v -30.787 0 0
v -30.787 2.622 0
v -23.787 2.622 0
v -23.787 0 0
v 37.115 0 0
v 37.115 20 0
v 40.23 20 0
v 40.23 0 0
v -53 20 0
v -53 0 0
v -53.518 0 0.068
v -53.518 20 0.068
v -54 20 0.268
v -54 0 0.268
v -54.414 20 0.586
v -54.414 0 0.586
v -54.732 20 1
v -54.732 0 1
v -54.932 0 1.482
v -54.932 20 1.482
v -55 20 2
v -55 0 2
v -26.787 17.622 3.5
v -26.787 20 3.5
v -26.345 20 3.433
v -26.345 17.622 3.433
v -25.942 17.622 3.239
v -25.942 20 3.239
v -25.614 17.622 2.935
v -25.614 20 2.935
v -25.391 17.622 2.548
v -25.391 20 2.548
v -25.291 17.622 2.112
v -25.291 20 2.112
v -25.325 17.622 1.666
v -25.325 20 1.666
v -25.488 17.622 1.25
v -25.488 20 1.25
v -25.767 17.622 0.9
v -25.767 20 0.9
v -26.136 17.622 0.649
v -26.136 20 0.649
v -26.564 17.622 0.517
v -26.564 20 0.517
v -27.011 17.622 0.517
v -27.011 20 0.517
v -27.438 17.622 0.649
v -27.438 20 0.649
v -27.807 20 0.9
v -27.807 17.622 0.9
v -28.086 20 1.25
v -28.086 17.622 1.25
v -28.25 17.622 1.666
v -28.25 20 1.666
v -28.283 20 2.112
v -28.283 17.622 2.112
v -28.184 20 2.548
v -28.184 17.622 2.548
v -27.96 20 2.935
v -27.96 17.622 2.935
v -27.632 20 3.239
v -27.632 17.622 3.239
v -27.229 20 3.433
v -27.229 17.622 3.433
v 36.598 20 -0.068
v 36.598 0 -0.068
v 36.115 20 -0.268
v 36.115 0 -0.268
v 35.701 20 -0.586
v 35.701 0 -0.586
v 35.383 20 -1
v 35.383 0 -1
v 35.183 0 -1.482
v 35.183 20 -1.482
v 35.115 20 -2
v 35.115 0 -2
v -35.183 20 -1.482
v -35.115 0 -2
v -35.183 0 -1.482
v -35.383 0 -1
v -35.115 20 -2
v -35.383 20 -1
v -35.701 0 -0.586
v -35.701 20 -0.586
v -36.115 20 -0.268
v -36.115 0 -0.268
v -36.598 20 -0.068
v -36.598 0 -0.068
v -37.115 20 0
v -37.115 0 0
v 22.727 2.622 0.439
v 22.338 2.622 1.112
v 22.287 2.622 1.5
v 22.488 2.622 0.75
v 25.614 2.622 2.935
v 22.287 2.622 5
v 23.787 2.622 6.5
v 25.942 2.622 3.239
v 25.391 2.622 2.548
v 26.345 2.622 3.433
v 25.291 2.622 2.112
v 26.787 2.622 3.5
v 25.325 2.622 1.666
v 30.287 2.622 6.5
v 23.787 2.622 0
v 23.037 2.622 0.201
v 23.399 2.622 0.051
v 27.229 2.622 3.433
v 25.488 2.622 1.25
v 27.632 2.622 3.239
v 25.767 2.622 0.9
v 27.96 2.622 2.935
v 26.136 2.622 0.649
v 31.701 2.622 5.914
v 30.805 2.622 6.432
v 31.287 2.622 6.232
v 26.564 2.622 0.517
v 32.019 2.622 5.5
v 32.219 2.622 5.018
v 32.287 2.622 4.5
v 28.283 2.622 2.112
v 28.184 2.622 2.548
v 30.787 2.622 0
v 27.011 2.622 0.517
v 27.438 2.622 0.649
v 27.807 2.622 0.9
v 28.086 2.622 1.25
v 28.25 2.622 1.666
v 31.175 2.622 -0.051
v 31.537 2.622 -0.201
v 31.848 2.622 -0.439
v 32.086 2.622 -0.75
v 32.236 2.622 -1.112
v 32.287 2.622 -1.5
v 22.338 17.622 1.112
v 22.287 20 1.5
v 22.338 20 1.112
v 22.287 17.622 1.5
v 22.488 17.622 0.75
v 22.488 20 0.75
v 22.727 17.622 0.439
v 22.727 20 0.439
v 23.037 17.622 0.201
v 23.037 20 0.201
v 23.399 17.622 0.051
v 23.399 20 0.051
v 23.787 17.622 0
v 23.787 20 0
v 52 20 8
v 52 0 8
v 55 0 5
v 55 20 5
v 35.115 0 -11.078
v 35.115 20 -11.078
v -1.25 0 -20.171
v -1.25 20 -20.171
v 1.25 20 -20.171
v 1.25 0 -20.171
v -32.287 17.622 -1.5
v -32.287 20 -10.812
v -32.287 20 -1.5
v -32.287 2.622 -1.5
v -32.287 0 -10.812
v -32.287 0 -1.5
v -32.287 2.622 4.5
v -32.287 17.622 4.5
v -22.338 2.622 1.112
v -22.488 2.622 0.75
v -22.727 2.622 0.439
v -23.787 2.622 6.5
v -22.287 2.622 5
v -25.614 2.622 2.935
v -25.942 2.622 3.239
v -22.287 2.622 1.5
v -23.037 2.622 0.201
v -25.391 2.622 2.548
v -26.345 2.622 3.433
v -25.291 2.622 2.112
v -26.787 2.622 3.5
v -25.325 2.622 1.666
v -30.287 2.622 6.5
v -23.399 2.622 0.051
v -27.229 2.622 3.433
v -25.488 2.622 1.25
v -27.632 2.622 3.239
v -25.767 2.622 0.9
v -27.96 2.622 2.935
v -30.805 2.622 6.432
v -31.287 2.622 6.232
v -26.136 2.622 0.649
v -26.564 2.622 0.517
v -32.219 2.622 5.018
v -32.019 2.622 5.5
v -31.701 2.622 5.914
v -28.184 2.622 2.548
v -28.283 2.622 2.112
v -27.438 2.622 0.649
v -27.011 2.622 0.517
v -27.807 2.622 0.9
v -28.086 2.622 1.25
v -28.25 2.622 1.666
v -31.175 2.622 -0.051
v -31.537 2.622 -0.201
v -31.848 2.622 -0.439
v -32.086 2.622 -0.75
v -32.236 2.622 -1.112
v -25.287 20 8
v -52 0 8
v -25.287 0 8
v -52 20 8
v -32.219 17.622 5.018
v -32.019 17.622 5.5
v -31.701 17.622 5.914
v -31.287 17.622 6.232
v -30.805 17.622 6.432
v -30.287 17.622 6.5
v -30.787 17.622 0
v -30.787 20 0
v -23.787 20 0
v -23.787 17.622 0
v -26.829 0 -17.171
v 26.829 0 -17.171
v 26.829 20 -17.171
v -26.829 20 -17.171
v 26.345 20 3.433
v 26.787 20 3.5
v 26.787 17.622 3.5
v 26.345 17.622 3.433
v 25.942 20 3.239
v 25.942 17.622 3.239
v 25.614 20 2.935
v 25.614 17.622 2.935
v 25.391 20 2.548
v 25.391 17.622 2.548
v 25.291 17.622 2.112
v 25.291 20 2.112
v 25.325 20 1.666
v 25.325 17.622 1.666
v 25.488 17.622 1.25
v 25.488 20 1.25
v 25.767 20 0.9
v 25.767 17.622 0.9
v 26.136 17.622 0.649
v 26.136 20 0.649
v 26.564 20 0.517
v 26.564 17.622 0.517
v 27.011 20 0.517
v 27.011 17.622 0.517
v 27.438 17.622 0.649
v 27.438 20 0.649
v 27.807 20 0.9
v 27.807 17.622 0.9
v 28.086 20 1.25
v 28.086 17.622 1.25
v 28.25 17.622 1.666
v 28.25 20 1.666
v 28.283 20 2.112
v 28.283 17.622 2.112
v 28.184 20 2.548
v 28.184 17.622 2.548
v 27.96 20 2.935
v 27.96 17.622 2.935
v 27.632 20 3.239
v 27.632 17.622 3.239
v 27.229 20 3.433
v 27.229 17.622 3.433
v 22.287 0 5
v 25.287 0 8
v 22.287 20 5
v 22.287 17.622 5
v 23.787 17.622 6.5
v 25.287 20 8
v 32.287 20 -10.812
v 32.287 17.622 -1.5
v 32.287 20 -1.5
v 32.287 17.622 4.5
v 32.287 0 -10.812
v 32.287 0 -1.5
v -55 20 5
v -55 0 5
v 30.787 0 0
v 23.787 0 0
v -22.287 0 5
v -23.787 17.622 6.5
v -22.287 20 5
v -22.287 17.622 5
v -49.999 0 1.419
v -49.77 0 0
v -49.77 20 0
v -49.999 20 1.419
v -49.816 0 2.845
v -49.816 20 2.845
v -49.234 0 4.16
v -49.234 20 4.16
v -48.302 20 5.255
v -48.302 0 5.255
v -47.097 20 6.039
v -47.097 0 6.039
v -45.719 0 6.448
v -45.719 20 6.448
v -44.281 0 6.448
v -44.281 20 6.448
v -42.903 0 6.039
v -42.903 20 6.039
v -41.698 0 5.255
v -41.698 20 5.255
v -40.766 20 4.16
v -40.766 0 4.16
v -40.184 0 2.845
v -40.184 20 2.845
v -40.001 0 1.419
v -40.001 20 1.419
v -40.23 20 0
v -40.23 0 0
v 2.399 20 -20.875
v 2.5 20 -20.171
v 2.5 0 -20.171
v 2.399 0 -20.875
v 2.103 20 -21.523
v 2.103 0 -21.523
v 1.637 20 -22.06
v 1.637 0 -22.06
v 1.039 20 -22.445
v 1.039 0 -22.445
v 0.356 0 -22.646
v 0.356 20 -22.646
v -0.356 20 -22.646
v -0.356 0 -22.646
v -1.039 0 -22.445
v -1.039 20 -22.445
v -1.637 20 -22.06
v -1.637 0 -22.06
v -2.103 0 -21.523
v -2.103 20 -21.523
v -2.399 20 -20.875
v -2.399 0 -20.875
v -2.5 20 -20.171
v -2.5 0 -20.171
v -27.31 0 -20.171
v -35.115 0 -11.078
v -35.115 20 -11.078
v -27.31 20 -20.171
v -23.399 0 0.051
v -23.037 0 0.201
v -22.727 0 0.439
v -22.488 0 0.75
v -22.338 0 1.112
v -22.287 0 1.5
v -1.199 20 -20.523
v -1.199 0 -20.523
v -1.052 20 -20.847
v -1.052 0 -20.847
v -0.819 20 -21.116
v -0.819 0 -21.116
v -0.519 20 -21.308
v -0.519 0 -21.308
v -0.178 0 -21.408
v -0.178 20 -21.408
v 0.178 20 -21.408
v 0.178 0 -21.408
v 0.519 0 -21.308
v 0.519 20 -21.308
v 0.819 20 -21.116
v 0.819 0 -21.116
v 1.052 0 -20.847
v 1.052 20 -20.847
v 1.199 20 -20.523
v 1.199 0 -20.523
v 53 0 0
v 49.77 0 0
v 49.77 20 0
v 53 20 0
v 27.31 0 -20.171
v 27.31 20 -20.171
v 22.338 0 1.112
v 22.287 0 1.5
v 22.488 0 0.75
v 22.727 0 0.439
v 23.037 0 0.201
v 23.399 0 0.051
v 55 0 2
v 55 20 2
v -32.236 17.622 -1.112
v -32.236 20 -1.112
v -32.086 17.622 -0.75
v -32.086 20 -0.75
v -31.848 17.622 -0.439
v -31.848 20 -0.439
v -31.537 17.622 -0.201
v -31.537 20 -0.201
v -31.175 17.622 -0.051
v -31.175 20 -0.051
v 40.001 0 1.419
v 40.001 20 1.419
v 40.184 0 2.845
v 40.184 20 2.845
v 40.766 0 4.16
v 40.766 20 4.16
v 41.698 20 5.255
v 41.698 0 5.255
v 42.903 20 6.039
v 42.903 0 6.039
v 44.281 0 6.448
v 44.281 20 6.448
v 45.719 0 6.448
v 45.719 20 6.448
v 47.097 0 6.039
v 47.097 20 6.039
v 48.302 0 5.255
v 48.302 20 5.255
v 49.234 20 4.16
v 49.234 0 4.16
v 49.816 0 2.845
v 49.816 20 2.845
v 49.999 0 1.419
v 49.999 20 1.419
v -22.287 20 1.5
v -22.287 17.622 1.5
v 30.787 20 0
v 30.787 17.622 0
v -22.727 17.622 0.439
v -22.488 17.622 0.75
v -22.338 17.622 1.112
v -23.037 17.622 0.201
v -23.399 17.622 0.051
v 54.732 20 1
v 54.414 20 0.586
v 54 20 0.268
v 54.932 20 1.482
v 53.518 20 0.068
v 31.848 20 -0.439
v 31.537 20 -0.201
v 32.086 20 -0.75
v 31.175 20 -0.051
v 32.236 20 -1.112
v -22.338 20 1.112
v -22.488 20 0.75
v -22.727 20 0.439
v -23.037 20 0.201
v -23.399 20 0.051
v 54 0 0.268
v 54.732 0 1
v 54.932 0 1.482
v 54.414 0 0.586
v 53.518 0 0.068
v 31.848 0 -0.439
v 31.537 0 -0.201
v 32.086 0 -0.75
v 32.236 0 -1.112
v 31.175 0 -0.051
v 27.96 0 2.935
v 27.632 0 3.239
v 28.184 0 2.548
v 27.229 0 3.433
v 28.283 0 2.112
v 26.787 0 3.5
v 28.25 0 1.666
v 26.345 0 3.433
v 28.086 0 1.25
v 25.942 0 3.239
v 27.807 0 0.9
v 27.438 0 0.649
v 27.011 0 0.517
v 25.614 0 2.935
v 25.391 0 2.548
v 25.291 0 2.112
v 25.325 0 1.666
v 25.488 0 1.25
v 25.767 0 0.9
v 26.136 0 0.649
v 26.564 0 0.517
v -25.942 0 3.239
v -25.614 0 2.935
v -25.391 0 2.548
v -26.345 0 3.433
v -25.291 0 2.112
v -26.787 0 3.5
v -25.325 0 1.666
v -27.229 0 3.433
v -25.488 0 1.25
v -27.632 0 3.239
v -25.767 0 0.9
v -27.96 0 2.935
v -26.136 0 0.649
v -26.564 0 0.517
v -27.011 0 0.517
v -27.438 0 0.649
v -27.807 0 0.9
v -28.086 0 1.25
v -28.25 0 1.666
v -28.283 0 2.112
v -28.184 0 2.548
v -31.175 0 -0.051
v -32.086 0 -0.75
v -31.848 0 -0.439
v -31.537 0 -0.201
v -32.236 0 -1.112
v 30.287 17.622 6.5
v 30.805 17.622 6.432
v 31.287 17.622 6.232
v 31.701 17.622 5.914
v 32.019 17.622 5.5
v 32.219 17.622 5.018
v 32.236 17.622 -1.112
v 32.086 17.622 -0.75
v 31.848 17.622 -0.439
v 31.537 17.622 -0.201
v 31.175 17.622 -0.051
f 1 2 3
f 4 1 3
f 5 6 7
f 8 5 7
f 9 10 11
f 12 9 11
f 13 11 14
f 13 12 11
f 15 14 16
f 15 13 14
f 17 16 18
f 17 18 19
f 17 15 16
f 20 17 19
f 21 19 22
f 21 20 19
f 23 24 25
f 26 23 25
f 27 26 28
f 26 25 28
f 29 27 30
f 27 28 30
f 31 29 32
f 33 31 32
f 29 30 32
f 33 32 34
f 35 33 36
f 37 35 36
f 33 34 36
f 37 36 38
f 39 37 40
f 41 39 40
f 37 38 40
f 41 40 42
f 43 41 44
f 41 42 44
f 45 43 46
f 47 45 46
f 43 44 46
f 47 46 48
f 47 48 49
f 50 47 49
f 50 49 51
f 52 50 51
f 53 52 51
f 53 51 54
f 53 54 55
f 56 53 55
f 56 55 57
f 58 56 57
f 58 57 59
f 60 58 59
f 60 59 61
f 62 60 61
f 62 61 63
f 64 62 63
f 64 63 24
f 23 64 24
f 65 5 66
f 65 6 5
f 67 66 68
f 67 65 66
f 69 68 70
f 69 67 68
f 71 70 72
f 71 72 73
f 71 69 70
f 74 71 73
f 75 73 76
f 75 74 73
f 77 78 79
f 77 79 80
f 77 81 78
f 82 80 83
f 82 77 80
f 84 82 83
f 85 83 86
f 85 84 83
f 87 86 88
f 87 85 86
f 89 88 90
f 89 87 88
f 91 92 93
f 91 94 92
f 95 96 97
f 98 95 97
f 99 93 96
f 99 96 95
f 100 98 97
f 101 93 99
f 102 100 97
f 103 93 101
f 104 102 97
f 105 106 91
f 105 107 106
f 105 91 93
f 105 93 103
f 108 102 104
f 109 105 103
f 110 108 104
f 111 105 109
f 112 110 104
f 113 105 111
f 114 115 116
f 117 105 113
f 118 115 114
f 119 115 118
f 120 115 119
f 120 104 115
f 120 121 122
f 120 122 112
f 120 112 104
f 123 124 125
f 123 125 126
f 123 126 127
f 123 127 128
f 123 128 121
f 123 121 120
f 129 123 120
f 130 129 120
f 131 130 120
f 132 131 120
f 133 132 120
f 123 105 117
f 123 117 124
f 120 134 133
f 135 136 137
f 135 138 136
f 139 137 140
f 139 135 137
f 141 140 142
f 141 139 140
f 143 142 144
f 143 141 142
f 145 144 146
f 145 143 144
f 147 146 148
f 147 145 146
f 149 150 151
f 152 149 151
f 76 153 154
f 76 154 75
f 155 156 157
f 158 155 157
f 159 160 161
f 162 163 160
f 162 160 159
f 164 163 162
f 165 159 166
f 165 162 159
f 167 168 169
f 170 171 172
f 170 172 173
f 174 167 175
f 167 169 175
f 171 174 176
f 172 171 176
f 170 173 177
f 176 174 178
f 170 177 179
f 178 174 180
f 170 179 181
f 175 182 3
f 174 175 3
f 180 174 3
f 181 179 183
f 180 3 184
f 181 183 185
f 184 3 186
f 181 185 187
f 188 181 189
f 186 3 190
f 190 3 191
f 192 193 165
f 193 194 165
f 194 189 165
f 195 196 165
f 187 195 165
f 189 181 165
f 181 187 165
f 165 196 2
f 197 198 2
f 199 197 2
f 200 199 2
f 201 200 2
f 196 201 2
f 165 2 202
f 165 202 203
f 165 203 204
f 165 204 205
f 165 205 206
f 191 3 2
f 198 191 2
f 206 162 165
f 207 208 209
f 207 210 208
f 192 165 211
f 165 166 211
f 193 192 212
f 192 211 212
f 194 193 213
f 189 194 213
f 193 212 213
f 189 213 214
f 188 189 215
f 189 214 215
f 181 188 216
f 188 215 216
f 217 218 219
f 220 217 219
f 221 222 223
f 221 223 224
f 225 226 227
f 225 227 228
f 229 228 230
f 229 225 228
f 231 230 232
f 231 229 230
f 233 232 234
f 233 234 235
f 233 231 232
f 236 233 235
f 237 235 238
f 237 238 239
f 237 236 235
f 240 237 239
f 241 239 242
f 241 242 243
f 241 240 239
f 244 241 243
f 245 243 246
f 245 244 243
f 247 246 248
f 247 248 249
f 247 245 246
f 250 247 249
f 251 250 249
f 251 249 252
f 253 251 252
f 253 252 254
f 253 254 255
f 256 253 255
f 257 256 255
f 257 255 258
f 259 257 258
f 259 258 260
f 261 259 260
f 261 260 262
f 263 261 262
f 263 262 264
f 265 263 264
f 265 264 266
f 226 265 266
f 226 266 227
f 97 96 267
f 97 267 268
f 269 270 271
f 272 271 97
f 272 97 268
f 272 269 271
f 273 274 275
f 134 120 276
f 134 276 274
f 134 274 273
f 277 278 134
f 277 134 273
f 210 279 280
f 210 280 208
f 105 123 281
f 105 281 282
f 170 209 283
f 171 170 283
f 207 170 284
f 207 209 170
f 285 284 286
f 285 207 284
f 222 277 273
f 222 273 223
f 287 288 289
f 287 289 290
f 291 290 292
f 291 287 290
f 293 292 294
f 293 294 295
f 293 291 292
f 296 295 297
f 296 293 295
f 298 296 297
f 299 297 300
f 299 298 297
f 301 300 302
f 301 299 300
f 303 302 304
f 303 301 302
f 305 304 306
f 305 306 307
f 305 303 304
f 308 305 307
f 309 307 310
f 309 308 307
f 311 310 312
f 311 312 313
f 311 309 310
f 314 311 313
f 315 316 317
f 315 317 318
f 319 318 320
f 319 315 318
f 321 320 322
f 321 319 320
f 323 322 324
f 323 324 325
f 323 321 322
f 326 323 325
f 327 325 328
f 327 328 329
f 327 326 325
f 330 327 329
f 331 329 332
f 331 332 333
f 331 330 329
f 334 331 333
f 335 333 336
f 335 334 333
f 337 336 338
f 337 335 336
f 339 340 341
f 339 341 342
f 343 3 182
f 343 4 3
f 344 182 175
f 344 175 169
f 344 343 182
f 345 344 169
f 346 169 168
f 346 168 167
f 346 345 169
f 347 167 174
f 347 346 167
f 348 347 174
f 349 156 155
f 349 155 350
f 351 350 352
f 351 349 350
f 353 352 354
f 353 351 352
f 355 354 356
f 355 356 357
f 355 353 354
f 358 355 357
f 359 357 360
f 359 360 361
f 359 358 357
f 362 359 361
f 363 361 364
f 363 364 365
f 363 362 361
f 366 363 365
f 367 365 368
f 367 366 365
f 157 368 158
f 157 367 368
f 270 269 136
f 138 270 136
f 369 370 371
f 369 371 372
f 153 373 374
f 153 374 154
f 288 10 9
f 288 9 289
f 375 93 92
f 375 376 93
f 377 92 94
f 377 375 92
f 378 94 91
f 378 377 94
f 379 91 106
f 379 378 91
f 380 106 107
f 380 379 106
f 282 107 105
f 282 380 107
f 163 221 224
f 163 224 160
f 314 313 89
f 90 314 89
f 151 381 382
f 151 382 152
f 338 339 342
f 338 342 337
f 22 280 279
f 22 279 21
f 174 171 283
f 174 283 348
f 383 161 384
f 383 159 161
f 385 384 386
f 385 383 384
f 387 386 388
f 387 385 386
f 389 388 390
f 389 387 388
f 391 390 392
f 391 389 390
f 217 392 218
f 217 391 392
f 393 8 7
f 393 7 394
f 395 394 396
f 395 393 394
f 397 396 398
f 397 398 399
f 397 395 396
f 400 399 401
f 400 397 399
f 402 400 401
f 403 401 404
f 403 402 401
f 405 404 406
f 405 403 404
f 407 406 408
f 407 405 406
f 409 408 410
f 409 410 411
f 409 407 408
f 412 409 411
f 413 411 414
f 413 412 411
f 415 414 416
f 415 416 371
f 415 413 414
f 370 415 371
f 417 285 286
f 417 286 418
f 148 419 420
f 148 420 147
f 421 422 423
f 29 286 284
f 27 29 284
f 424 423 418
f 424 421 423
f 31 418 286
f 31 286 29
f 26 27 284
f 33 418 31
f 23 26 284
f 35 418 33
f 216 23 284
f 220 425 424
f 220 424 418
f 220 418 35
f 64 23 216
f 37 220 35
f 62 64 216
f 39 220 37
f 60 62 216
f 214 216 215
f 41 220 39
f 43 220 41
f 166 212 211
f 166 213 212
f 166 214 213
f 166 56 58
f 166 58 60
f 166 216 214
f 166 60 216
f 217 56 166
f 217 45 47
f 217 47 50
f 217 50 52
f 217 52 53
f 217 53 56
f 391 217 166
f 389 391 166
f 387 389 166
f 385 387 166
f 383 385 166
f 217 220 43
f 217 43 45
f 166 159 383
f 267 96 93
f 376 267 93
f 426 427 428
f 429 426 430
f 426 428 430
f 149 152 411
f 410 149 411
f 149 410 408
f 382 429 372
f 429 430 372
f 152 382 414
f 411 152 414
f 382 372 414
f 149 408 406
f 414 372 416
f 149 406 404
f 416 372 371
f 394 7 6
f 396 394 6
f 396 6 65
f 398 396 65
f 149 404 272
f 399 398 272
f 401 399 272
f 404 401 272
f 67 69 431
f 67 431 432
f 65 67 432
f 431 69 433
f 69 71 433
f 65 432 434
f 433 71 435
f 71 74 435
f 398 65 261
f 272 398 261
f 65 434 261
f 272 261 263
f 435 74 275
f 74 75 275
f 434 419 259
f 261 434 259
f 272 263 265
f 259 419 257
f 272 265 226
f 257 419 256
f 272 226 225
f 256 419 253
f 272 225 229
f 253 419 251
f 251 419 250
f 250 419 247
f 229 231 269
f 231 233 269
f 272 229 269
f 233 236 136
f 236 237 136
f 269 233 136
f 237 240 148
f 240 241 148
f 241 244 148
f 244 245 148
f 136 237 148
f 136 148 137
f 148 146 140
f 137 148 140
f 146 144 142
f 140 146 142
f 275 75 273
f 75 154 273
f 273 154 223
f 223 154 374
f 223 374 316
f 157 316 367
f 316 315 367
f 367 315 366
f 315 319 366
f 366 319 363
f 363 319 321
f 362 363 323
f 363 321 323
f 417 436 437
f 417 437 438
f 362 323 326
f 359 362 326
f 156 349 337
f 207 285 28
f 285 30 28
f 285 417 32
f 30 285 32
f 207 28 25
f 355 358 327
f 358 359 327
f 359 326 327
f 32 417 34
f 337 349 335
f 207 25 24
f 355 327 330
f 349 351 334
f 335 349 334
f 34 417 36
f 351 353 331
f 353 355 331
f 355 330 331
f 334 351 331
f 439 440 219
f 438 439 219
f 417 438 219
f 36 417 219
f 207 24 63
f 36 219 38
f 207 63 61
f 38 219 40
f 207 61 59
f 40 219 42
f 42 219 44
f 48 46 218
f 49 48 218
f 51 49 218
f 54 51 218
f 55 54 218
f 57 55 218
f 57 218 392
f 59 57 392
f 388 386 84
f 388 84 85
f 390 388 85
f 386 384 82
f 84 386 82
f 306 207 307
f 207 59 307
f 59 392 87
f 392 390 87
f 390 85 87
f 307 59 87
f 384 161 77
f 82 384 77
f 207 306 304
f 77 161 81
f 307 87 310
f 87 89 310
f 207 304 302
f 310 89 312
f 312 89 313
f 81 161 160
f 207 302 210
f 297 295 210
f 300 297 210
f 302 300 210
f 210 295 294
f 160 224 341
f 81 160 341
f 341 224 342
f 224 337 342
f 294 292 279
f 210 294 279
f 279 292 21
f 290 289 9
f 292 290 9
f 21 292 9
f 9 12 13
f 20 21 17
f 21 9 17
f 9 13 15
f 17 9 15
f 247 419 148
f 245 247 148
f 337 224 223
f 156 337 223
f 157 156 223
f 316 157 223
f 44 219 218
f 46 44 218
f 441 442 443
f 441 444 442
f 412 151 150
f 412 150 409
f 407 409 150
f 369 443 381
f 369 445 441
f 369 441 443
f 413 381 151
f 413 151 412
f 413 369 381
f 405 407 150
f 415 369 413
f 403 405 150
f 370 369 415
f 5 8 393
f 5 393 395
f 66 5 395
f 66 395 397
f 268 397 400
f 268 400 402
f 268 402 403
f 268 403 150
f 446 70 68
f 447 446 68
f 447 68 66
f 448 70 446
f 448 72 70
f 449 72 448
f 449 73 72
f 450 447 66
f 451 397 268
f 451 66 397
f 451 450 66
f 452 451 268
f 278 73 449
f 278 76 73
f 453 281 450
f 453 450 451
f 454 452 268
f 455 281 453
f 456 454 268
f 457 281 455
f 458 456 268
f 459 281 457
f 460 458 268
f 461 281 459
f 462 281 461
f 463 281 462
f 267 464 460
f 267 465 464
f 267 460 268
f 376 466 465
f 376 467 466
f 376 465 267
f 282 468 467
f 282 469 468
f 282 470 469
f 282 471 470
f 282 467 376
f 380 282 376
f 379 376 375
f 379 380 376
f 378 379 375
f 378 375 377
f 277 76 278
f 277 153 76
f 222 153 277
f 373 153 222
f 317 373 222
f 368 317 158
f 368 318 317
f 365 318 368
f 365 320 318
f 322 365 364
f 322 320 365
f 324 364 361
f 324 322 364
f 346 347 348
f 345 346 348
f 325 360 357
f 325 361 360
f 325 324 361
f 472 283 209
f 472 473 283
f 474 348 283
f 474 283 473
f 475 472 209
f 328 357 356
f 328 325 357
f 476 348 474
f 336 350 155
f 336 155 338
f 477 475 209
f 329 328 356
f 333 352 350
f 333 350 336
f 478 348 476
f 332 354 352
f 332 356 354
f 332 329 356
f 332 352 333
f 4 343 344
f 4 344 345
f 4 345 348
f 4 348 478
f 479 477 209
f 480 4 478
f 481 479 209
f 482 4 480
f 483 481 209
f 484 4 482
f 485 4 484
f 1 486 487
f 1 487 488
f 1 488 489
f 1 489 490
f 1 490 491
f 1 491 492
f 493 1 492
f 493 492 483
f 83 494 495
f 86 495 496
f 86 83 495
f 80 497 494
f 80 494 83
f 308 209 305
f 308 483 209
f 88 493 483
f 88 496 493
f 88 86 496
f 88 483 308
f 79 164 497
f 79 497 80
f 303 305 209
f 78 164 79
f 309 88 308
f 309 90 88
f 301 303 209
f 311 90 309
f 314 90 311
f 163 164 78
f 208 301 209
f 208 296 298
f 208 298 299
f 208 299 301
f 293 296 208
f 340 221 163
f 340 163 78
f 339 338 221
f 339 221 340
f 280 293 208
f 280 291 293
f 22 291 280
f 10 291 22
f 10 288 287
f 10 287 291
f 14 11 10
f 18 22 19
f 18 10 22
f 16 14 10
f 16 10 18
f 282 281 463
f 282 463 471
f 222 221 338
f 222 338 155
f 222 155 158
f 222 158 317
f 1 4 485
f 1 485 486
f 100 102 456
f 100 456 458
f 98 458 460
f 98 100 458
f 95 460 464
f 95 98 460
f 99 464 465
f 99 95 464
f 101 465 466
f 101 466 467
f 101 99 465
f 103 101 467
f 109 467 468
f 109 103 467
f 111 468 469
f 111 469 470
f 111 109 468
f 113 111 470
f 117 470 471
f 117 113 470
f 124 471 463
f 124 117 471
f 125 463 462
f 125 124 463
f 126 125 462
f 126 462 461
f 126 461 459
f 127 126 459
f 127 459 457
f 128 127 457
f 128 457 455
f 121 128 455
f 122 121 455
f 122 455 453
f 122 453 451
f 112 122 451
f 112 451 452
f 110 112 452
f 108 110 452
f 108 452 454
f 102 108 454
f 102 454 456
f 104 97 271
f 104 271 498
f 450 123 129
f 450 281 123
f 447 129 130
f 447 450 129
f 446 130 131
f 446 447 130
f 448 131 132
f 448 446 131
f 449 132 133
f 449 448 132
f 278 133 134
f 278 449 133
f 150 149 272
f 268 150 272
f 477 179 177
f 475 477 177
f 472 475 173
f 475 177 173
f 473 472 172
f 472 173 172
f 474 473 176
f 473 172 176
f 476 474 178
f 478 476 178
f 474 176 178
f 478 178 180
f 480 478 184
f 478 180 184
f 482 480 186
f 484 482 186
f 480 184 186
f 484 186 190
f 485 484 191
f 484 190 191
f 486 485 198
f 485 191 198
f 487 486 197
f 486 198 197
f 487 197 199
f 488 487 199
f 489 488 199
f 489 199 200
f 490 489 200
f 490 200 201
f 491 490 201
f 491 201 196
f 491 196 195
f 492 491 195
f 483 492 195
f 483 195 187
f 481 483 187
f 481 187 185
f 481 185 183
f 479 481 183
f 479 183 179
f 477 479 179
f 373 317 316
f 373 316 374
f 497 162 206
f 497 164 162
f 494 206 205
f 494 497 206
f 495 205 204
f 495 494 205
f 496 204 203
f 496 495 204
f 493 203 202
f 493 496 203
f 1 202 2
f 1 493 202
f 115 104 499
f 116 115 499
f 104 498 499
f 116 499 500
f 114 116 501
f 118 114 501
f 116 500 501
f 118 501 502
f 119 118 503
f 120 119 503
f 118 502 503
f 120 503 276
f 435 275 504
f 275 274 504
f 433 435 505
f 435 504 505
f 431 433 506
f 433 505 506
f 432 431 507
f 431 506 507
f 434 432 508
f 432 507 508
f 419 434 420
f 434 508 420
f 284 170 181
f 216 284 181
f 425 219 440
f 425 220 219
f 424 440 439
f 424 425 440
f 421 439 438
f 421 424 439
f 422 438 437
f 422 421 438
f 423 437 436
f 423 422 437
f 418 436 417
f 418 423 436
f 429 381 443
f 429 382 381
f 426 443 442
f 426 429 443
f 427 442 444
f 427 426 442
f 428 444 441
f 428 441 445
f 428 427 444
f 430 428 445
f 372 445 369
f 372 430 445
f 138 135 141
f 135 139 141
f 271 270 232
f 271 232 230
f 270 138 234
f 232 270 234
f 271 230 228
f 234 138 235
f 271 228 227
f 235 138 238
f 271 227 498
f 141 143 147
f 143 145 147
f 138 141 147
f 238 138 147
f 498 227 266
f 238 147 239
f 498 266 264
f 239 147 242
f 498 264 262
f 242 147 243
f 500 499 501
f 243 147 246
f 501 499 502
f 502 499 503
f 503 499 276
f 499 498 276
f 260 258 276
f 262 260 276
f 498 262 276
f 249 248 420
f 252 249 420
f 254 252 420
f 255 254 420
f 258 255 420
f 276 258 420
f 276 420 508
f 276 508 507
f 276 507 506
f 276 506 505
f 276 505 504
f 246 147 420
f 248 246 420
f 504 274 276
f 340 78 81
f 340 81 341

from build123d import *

# Parameters (mm, degrees)
EXTRUDE_1_DEPTH     = 20
SKETCH_2_W          = 10
SKETCH_2_H          = 8
SKETCH_2_R          = 1.5
EXTRUDE_2_DEPTH     = 20
SKETCH_3_W          = 10
SKETCH_3_H          = 15
CUT_EXTRUDE_1_DEPTH = 6.5
CHAMFER_1_SIZE      = 3
FILLET_1_R          = 2
FILLET_2_R          = 1.5
EXTRUDE_3_DEPTH     = 20


with BuildPart() as part:
    # 草图1 → 凸台-拉伸1 (new body)
    with BuildSketch(Plane(origin=(0, 0, 0), x_dir=(1, 0, 0), z_dir=(0, 1, 0))):
        with BuildLine():
            Line((-52.384848004, 0), (-49.769696007, 0))
            ThreePointArc((-49.769696007, 0), (-45, -6.5), (-40.230303993, 0))
            Line((-40.230303993, 0), (-35.115151996, 0))
            Line((-35.115151996, 0), (-35.115151996, 11.078445968))
            Line((-35.115151996, 11.078445968), (-27.310228331, 20.17100506))
            Line((-27.310228331, 20.17100506), (27.310228331, 20.17100506))
            Line((27.310228331, 20.17100506), (35.115151996, 11.078445968))
            Line((35.115151996, 11.078445968), (35.115151996, 0))
            Line((35.115151996, 0), (40.230303993, 0))
            ThreePointArc((40.230303993, 0), (45, -6.5), (49.769696007, 0))
            Line((49.769696007, 0), (52.384848004, 0))
            Line((52.384848004, 0), (55, 0))
            Line((55, 0), (55, -8))
            Line((55, -8), (32.287206254, -8))
            Line((32.287206254, -8), (32.287206254, 10.811768263))
            Line((32.287206254, 10.811768263), (26.82852765, 17.17100506))
            Line((26.82852765, 17.17100506), (-26.82852765, 17.17100506))
            Line((-26.82852765, 17.17100506), (-32.287206254, 10.811768263))
            Line((-32.287206254, 10.811768263), (-32.287206254, -8))
            Line((-32.287206254, -8), (-55, -8))
            Line((-55, -8), (-55, 0))
            Line((-55, 0), (-52.384848004, 0))
        make_face()
    extrude(amount=EXTRUDE_1_DEPTH)

    # 草图2 → 凸台-拉伸2 (add)
    with BuildSketch(Plane(origin=(0, 20, 0), x_dir=(1, 0, 0), z_dir=(0, 1, 0))):
        with Locations((-27.287206254, -4)):
            Rectangle(SKETCH_2_W, SKETCH_2_H)
        with Locations(Location((-26.787206254, -2, 0), (0, 0, 270))):
            Circle(SKETCH_2_R, mode=Mode.SUBTRACT)
    extrude(amount=-EXTRUDE_2_DEPTH)

    # 草图3 → 切除-拉伸1 (cut)
    with BuildSketch(Plane(origin=(0, 0, 0), x_dir=(-1, 0, 0), z_dir=(0, 0, -1))):
        with Locations((27.287206254, 10.122040723)):
            Rectangle(SKETCH_3_W, SKETCH_3_H)
    extrude(amount=-CUT_EXTRUDE_1_DEPTH, mode=Mode.SUBTRACT)

    # 镜向1: part across plane


with BuildPart() as part_1:
    add(part.part)
    add(part.part.mirror(Plane.ZY))

    # 倒角1
    # the kernel refuses this chamfer: 3 mm, written as the material it takes off along each edge
    with BuildSketch(Plane(origin=(22.287206254, 27.715048964, 8), x_dir=(-0.027495876610587933, 0, -0.9996219169112968), z_dir=(0, -1, 0)), Plane(origin=(-22.287206254, 27.715048964, 8), x_dir=(-0.9996219169112968, 0, 0.02749587661058619), z_dir=(0, -1, 0))) as chamfer_1_piece_1:
        Polygon((CHAMFER_1_SIZE * 0.999621916911, CHAMFER_1_SIZE * 0.0274958766106), (-CHAMFER_1_SIZE * 0.0274958766106, CHAMFER_1_SIZE * 0.999621916911), (0, 0), align=None)
    extrude(amount=35.430097928, mode=Mode.SUBTRACT)
    with BuildSketch(Plane(origin=(55, -7.715048964, 8), x_dir=(-0.9996219169112965, 0, 0.02749587661058705), z_dir=(0, 1, 0)), Plane(origin=(-55, -7.715048964, 8), x_dir=(-0.027495876610586775, 0, -0.9996219169112968), z_dir=(0, 1, 0))) as chamfer_1_piece_2:
        Polygon((CHAMFER_1_SIZE * 0.999621916911, -CHAMFER_1_SIZE * 0.0274958766106), (-CHAMFER_1_SIZE * 0.0274958766106, -CHAMFER_1_SIZE * 0.999621916911), (0, 0), align=None)
    extrude(amount=35.430097928, mode=Mode.SUBTRACT)

    # 圆角1
    fillet_1_edges = [part_1.edges().sort_by_distance(p)[0] for p in [
        (32.287206254, 10.122040723, 6.5),
        (55, 10, 0),
        (-55, 10, 0),
        (-35.115151996, 10, 0),
        (35.115151996, 10, 0),
        (-32.287206254, 10.122040723, 6.5),
    ]]
    fillet(fillet_1_edges, radius=FILLET_1_R)

    # 圆角2
    fillet_2_edges = [part_1.edges().sort_by_distance(p)[0] for p in [
        (22.287206254, 1.311020362, 0),
        (32.287206254, 1.311020362, 0),
        (32.287206254, 18.811020362, 0),
        (22.287206254, 18.811020362, 0),
        (-22.287206254, 1.311020362, 0),
        (-32.287206254, 1.311020362, 0),
        (-32.287206254, 18.811020362, 0),
        (-22.287206254, 18.811020362, 0),
    ]]
    fillet(fillet_2_edges, radius=FILLET_2_R)

    # 草图4 → 凸台-拉伸3 (add)
    with BuildSketch(Plane(origin=(0, 20, 0), x_dir=(1, 0, 0), z_dir=(0, 1, 0))):
        with BuildLine():
            Line((-2.5, 20.17100506), (-1.25, 20.17100506))
            ThreePointArc((-1.25, 20.17100506), (0, 21.42100506), (1.25, 20.17100506))
            Line((1.25, 20.17100506), (2.5, 20.17100506))
            ThreePointArc((2.5, 20.17100506), (0, 22.67100506), (-2.5, 20.17100506))
        make_face()
    extrude(amount=-EXTRUDE_3_DEPTH)


solid = part_1.part
